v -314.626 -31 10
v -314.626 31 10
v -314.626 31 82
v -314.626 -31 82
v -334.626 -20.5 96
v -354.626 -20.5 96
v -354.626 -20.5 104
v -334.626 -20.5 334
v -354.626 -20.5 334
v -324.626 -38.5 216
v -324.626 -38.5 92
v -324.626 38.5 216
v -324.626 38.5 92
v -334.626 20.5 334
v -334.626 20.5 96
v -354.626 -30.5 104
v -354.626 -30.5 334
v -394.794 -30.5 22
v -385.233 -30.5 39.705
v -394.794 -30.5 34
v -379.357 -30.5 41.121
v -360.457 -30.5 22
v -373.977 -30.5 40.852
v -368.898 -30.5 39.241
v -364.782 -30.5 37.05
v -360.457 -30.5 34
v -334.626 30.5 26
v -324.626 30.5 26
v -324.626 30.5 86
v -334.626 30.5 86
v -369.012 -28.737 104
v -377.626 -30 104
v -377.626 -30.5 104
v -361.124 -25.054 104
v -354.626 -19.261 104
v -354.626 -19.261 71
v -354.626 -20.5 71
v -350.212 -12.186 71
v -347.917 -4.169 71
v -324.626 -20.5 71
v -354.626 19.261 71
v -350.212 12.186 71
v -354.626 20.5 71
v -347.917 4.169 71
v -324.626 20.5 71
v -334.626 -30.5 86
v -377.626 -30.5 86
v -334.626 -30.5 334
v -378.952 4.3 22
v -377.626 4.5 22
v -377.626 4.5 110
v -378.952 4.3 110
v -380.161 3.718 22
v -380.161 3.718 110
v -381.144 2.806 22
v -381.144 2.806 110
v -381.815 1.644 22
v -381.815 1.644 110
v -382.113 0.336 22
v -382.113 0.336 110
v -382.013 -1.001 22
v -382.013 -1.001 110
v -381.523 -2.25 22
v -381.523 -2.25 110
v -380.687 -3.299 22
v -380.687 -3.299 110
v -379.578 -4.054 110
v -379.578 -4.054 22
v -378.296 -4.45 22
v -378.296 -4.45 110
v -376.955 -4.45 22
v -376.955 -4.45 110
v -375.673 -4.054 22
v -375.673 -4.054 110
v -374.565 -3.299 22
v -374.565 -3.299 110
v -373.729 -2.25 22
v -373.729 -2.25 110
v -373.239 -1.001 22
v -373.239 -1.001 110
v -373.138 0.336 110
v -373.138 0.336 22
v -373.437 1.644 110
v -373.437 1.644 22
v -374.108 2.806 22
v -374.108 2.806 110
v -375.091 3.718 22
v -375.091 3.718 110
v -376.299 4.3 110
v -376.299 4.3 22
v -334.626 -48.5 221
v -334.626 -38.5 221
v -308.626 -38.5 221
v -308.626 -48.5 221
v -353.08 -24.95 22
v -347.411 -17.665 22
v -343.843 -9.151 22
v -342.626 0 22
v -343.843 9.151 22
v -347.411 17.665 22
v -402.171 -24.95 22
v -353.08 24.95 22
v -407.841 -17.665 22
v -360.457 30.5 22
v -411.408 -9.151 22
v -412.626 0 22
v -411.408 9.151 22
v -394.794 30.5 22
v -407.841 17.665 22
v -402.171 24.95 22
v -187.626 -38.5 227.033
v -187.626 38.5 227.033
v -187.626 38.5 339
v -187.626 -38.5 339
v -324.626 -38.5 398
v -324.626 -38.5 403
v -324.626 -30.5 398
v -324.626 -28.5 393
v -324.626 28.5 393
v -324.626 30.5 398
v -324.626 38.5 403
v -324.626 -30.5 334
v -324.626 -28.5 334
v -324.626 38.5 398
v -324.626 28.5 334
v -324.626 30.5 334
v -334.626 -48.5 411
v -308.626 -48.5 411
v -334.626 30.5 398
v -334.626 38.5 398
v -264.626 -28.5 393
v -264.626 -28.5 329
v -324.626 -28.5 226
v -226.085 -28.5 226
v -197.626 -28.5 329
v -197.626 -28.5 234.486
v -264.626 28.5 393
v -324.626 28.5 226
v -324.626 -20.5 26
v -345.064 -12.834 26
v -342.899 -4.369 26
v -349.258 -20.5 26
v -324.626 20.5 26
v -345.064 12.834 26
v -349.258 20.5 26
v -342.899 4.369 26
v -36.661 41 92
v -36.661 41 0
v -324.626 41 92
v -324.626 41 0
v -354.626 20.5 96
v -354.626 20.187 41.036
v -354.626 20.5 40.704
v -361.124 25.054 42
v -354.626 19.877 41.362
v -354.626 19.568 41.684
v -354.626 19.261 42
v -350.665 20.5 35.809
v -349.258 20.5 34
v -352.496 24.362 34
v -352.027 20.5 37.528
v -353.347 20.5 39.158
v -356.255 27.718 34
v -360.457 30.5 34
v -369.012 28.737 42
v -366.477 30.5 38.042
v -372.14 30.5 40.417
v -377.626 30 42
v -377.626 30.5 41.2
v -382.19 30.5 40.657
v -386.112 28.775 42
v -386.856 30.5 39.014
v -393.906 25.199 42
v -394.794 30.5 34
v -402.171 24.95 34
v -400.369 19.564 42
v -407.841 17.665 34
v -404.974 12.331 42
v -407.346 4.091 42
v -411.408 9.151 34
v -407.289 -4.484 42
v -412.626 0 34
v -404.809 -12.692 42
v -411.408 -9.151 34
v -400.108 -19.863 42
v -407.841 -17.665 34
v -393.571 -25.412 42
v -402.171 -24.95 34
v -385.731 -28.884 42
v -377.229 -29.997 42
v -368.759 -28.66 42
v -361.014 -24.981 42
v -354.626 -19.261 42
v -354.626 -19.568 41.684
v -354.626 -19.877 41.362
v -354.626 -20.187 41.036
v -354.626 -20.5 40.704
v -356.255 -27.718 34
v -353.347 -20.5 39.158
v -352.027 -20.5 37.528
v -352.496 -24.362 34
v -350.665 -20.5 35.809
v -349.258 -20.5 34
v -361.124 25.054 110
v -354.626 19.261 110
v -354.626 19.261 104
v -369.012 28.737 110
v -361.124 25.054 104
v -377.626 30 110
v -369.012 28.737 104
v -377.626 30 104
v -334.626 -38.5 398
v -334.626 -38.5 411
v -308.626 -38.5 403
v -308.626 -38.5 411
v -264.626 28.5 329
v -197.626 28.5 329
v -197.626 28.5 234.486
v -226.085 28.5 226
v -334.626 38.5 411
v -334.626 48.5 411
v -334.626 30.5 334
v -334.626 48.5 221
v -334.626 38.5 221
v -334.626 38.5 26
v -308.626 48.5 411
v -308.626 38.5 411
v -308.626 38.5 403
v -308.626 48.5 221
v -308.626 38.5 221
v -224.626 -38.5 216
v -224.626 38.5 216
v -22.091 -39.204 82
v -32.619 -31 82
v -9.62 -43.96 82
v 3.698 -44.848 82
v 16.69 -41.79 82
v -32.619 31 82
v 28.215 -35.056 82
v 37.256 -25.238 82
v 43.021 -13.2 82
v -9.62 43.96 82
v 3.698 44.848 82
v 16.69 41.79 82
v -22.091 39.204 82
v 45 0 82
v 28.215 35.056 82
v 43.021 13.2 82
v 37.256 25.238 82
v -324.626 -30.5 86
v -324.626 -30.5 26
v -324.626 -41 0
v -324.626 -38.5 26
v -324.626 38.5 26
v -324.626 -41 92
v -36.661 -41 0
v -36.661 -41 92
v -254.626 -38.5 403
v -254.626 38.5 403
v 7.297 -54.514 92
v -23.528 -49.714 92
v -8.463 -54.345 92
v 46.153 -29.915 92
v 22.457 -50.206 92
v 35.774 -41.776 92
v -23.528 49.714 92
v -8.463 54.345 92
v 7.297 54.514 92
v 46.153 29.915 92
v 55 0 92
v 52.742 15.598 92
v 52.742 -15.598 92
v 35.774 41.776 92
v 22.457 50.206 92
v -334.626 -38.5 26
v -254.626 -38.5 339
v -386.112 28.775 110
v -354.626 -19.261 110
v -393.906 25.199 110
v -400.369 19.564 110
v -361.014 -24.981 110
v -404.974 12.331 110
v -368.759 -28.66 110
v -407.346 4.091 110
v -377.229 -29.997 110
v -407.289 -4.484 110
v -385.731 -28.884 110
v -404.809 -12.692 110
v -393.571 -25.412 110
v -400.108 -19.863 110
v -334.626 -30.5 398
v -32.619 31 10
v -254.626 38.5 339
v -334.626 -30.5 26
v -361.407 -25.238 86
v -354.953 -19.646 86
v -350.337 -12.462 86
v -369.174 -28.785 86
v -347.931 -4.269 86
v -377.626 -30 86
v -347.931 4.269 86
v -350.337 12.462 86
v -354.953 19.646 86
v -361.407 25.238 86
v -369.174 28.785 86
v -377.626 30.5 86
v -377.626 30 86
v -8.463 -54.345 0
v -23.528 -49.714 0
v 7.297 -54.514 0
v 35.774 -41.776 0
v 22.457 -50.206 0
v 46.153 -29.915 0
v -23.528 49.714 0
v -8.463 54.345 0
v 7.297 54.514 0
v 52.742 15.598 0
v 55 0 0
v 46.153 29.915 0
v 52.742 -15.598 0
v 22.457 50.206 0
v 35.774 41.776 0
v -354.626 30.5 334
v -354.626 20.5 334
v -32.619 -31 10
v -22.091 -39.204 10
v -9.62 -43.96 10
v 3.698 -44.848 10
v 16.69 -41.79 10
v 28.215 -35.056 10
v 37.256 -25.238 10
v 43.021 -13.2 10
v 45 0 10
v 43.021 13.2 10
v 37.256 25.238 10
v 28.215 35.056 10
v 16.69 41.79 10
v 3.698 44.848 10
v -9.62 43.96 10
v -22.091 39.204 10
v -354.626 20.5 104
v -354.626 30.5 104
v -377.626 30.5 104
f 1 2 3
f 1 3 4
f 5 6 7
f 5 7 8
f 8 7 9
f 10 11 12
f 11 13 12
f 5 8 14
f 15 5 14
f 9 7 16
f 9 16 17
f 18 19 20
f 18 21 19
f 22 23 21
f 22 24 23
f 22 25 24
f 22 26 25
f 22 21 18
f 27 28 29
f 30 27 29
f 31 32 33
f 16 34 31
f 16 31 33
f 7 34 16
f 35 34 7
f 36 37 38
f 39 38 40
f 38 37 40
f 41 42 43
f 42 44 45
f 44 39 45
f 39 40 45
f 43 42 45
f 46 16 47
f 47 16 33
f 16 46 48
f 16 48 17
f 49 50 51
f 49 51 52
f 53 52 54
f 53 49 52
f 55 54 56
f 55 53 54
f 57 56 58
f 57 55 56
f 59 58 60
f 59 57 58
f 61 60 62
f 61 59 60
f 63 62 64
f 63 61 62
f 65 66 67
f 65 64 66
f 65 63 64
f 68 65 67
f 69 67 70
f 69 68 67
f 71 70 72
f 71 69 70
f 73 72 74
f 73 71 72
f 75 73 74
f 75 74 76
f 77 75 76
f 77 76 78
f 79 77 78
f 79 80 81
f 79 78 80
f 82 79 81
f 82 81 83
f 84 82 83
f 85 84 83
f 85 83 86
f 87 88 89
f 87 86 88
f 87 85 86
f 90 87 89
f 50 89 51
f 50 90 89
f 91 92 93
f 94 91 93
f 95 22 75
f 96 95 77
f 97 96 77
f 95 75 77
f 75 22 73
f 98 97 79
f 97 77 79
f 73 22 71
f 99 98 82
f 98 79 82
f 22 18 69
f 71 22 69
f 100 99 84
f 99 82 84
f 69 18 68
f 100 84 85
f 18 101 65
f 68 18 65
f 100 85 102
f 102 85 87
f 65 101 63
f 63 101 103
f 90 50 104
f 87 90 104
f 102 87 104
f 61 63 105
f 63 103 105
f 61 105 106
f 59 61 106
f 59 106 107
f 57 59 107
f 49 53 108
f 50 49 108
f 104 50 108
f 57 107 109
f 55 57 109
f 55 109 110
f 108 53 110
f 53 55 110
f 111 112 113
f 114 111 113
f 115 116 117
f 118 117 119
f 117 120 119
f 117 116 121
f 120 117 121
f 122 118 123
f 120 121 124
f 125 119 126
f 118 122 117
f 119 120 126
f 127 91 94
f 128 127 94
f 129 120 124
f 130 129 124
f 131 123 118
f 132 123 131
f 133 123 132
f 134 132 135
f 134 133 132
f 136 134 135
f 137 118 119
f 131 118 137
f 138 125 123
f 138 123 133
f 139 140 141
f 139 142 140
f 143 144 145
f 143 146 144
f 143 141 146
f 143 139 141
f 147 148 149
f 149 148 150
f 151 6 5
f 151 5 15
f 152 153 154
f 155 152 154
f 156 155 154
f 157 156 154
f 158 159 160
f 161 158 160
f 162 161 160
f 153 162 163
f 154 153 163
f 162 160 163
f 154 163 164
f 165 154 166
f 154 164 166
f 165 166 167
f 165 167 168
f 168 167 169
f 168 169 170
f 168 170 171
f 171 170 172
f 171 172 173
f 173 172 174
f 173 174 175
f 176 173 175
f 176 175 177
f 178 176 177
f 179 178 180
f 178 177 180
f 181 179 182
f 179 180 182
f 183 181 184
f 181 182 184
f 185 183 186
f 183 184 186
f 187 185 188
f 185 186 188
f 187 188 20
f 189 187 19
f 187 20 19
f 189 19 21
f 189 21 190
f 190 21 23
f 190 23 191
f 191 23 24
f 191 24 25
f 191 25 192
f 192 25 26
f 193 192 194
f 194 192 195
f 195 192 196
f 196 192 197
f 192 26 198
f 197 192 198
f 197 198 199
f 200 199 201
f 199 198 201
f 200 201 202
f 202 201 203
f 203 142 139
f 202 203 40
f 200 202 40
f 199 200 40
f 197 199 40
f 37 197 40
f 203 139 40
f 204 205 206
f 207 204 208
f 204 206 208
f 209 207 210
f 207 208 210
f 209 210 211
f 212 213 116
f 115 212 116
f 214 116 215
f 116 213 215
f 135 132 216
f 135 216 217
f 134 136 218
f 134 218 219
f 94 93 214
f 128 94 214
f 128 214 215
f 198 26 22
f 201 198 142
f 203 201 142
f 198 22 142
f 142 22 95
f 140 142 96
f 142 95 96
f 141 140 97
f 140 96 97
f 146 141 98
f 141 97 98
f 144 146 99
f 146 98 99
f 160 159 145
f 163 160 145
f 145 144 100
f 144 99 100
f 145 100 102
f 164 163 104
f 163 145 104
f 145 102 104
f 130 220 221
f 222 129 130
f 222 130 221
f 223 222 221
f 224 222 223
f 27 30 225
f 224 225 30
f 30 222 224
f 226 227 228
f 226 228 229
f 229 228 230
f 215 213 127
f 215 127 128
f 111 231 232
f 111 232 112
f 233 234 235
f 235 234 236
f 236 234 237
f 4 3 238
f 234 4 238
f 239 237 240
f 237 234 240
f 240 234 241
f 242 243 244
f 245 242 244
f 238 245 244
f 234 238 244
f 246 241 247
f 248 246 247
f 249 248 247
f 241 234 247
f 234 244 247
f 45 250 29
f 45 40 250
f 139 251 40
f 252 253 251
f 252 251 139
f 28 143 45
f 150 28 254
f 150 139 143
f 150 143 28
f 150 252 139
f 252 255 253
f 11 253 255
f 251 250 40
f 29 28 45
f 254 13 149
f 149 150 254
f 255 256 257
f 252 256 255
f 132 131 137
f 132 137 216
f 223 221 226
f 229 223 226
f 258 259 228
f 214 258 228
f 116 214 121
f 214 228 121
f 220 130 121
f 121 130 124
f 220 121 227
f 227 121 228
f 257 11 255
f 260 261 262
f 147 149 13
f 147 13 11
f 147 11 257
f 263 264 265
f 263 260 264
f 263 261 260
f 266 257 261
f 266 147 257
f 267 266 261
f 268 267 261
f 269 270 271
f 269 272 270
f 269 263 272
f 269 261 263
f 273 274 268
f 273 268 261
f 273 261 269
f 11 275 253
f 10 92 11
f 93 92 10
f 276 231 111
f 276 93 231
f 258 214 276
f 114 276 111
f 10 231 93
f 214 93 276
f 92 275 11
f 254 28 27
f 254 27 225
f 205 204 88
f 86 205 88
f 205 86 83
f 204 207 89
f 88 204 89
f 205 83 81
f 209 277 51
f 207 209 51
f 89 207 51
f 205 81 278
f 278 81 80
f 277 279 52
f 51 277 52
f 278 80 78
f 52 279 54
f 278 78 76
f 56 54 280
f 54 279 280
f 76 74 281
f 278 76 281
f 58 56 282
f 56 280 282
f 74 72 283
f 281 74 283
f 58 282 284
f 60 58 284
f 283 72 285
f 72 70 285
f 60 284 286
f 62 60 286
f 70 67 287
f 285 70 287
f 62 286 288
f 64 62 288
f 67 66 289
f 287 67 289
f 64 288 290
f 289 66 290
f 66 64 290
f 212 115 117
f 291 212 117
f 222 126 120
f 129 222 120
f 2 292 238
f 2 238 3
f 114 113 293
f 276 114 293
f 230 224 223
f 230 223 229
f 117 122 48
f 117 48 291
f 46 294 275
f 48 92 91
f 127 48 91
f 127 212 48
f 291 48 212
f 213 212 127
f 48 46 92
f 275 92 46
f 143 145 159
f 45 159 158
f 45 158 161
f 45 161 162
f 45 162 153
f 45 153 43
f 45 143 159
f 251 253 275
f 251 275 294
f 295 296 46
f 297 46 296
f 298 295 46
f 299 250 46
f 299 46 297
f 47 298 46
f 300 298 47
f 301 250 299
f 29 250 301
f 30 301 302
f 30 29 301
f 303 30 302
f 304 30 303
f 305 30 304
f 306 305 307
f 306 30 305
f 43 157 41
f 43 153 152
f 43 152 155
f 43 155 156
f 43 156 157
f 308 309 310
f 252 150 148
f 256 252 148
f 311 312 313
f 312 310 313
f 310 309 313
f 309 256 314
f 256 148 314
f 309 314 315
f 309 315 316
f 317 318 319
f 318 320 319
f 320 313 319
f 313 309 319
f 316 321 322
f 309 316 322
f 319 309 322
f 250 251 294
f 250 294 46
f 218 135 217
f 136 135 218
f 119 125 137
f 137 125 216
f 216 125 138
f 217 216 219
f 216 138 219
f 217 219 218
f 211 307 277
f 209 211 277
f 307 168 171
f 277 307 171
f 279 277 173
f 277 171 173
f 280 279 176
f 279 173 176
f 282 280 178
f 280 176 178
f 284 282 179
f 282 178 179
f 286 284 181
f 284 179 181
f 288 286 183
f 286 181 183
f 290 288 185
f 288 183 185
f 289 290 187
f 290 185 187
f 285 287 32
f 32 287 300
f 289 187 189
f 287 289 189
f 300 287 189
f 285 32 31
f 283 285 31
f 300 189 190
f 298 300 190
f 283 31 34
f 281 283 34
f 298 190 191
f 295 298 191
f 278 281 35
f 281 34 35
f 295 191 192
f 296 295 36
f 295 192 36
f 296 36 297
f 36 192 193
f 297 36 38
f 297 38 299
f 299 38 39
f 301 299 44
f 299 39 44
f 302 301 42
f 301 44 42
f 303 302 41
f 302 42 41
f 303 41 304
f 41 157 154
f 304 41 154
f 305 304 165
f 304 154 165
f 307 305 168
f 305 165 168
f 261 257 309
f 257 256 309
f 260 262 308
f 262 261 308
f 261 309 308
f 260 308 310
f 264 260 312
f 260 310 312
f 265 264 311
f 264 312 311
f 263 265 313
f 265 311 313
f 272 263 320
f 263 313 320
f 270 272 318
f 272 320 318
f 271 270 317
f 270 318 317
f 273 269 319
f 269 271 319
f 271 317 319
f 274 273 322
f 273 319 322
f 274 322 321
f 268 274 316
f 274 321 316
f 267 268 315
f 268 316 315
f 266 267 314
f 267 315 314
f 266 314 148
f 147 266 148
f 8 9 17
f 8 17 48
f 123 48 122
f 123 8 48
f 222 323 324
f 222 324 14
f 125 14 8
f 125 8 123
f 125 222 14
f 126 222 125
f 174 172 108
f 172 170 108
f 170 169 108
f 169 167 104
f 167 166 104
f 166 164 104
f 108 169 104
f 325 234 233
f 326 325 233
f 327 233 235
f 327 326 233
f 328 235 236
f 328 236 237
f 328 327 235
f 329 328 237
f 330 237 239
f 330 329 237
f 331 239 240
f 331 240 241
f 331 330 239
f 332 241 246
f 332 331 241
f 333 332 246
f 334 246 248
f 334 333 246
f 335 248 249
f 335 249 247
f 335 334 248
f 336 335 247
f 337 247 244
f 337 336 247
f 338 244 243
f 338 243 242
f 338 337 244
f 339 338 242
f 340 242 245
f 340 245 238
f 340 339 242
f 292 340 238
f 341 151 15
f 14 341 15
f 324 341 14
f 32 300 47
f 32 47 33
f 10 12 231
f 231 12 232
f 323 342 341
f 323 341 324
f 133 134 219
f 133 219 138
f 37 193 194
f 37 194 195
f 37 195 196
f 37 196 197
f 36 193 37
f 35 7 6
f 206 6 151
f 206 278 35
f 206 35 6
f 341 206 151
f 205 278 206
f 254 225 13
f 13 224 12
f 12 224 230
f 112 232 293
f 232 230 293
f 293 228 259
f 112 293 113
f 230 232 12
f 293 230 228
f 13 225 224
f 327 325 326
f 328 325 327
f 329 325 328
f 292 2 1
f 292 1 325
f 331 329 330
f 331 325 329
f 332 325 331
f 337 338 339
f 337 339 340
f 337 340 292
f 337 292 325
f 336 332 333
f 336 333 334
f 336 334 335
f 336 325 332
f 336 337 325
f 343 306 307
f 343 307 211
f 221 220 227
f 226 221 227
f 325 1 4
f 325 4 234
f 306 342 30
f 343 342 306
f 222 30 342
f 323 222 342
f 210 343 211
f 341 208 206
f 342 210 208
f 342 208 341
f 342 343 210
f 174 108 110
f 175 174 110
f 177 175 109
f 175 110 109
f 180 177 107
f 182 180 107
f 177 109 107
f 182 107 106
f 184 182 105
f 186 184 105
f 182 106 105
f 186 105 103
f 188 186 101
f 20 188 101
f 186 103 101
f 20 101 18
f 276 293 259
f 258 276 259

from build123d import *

# Parameters (mm, degrees)
CROQUIS1_R                 = 55
SALIENTE_EXTRUIR1_DEPTH    = 92
CROQUIS2_W                 = 287.965144552
CROQUIS2_H                 = 82
SALIENTE_EXTRUIR2_DEPTH    = 92
CROQUIS5_W                 = 372
CROQUIS5_H                 = 8
SALIENTE_EXTRUIR5_DEPTH    = 10
SALIENTE_EXTRUIR6_START    = -77
SALIENTE_EXTRUIR6_DEPTH    = 77
VACIADO1_START             = -28.5
VACIADO1_DEPTH             = 57
VACIADO1_START_2           = 10
VACIADO1_2_DEPTH           = 72
CROQUIS8_W                 = 26
CROQUIS8_H                 = 190
SALIENTE_EXTRUIR7_DEPTH    = 10
CROQUIS9_W                 = 26
CROQUIS9_H                 = 190
SALIENTE_EXTRUIR8_DEPTH    = 10
SALIENTE_EXTRUIR9_DEPTH    = 61
CORTAR_EXTRUIR1_DEPTH      = 69
CORTAR_EXTRUIR1_DEPTH_BACK = 16
CORTAR_EXTRUIR2_DEPTH      = 514.698364466
CORTAR_EXTRUIR2_DEPTH_BACK = 514.698364466
CROQUIS14_R                = 4.5
VACIADO4_START             = -354.625750112
VACIADO4_OUTLINE_W         = 41
VACIADO4_OUTLINE_H         = 238
VACIADO4_DEPTH             = 20
CROQUIS15_W                = 45
CROQUIS15_H                = 41
SALIENTE_EXTRUIR10_DEPTH   = 30


# Read off the part's stored shape, not the designer's step: Vaciado1, Vaciado4
with BuildPart() as part:
    # Croquis1 → Saliente-Extruir1 (new body)
    with BuildSketch(Plane.XY):
        Circle(CROQUIS1_R)
    extrude(amount=SALIENTE_EXTRUIR1_DEPTH)

    # Croquis2 → Saliente-Extruir2 (add)
    with BuildSketch(Plane(origin=(0, 0, 0), x_dir=(-1, 0, 0), z_dir=(0, 0, -1))):
        with Locations((180.643177836, 0)):
            Rectangle(CROQUIS2_W, CROQUIS2_H)
    extrude(amount=-SALIENTE_EXTRUIR2_DEPTH)

    # Croquis5 → Saliente-Extruir5 (add)
    with BuildSketch(Plane.ZY.offset(324.625750112)):
        with Locations((212, 34.5)):
            Rectangle(CROQUIS5_W, CROQUIS5_H)
        with Locations((212, -34.5)):
            Rectangle(CROQUIS5_W, CROQUIS5_H)
    extrude(amount=SALIENTE_EXTRUIR5_DEPTH)

    # Croquis6 → Saliente-Extruir6 (add)
    with BuildSketch(Plane.XZ.offset(38.5).offset(SALIENTE_EXTRUIR6_START)):
        Polygon((-324.625750112, 216), (-224.625750112, 216), (-187.625750112, 227.033203383), (-187.625750112, 339), (-254.625750112, 339), (-254.625750112, 403), (-324.625750112, 403), align=None)
    extrude(amount=SALIENTE_EXTRUIR6_DEPTH)

    # Vaciado1 outline → Vaciado1 (cut)
    with BuildSketch(Plane(origin=(0, 0, 0), x_dir=(1, 0, 0), z_dir=(0, 1, 0)).offset(VACIADO1_START)):
        Polygon((-197.625750112, -234.486389827), (-226.08497566, -226), (-324.625750112, -226), (-324.625750112, -393), (-264.625750112, -393), (-264.625750112, -329), (-197.625750112, -329), align=None)
    extrude(amount=VACIADO1_DEPTH, mode=Mode.SUBTRACT)

    # Vaciado1 2 outline → Vaciado1 2 (cut)
    with BuildSketch(Plane.XY.offset(VACIADO1_START_2)):
        with BuildLine():
            Line((-32.619012861, 31), (-314.625750112, 31))
            Line((-314.625750112, 31), (-314.625750112, -31))
            Line((-314.625750112, -31), (-32.619012861, -31))
            ThreePointArc((-32.619012861, -31), (45, 0), (-32.619012861, 31))
        make_face()
    extrude(amount=VACIADO1_2_DEPTH, mode=Mode.SUBTRACT)

    # Croquis8 → Saliente-Extruir7 (add)
    with BuildSketch(Plane(origin=(0, 38.5, 0), x_dir=(1, 0, 0), z_dir=(0, 1, 0))):
        with Locations((-321.625750112, -316)):
            Rectangle(CROQUIS8_W, CROQUIS8_H)
    extrude(amount=SALIENTE_EXTRUIR7_DEPTH)

    # Croquis9 → Saliente-Extruir8 (add)
    with BuildSketch(Plane.XZ.offset(38.5)):
        with Locations((-321.625750112, 316)):
            Rectangle(CROQUIS9_W, CROQUIS9_H)
    extrude(amount=SALIENTE_EXTRUIR8_DEPTH)

    # Croquis10 → Saliente-Extruir9 (add)
    with BuildSketch(Plane.XZ.offset(-30.5)):
        Polygon((-324.625750112, 86), (-377.625750112, 86), (-377.625750112, 104), (-354.625750112, 104), (-354.625750112, 334), (-324.625750112, 334), align=None)
    extrude(amount=SALIENTE_EXTRUIR9_DEPTH)

    # Croquis11 → Revolución1 (revolve)
    with BuildSketch(Plane.ZY.offset(377.625750112)):
        Polygon((110, 0), (110, 30), (42, 30), (34, 35), (22, 35), (22, 0), align=None)
    revolve(axis=Axis((-377.625750112, 0, 0), (0, 0, 1)))

    # Croquis13 → Cortar-Extruir1 (cut, two sides: drawn at the far end of the back side and taken through both)
    with BuildSketch(Plane.ZY.offset(354.625750112).offset(-CORTAR_EXTRUIR1_DEPTH_BACK)):
        Polygon((48.064346335, 30.5), (14.405684341, 30.5), (14.405684341, 38.395591982), (46.194420669, 38.5), align=None)
        Polygon((43.319665348, -30.5), (18.175664467, -30.5), (19.260307642, -37.859564216), (38.945879671, -34.958329751), align=None)
    extrude(amount=CORTAR_EXTRUIR1_DEPTH + CORTAR_EXTRUIR1_DEPTH_BACK, mode=Mode.SUBTRACT)

    # Croquis14 → Cortar-Extruir2 (cut, two sides: drawn at the far end of the back side and taken through both)
    with BuildSketch(Plane.XY.offset(110).offset(-CORTAR_EXTRUIR2_DEPTH_BACK)):
        with Locations(Location((-377.625750112, 0, 0), (0, 0, 90))):
            Circle(CROQUIS14_R)
    extrude(amount=CORTAR_EXTRUIR2_DEPTH + CORTAR_EXTRUIR2_DEPTH_BACK, mode=Mode.SUBTRACT)

    # Vaciado4 outline → Vaciado4 (cut)
    with BuildSketch(Plane.YZ.offset(VACIADO4_START)):
        with Locations((0, 215)):
            Rectangle(VACIADO4_OUTLINE_W, VACIADO4_OUTLINE_H)
    extrude(amount=VACIADO4_DEPTH, mode=Mode.SUBTRACT)

    # Croquis15 → Saliente-Extruir10 (add)
    with BuildSketch(Plane.ZY.offset(324.625750112)):
        with Locations((48.5, 0)):
            Rectangle(CROQUIS15_W, CROQUIS15_H)
    extrude(amount=SALIENTE_EXTRUIR10_DEPTH)


solid = part.part
